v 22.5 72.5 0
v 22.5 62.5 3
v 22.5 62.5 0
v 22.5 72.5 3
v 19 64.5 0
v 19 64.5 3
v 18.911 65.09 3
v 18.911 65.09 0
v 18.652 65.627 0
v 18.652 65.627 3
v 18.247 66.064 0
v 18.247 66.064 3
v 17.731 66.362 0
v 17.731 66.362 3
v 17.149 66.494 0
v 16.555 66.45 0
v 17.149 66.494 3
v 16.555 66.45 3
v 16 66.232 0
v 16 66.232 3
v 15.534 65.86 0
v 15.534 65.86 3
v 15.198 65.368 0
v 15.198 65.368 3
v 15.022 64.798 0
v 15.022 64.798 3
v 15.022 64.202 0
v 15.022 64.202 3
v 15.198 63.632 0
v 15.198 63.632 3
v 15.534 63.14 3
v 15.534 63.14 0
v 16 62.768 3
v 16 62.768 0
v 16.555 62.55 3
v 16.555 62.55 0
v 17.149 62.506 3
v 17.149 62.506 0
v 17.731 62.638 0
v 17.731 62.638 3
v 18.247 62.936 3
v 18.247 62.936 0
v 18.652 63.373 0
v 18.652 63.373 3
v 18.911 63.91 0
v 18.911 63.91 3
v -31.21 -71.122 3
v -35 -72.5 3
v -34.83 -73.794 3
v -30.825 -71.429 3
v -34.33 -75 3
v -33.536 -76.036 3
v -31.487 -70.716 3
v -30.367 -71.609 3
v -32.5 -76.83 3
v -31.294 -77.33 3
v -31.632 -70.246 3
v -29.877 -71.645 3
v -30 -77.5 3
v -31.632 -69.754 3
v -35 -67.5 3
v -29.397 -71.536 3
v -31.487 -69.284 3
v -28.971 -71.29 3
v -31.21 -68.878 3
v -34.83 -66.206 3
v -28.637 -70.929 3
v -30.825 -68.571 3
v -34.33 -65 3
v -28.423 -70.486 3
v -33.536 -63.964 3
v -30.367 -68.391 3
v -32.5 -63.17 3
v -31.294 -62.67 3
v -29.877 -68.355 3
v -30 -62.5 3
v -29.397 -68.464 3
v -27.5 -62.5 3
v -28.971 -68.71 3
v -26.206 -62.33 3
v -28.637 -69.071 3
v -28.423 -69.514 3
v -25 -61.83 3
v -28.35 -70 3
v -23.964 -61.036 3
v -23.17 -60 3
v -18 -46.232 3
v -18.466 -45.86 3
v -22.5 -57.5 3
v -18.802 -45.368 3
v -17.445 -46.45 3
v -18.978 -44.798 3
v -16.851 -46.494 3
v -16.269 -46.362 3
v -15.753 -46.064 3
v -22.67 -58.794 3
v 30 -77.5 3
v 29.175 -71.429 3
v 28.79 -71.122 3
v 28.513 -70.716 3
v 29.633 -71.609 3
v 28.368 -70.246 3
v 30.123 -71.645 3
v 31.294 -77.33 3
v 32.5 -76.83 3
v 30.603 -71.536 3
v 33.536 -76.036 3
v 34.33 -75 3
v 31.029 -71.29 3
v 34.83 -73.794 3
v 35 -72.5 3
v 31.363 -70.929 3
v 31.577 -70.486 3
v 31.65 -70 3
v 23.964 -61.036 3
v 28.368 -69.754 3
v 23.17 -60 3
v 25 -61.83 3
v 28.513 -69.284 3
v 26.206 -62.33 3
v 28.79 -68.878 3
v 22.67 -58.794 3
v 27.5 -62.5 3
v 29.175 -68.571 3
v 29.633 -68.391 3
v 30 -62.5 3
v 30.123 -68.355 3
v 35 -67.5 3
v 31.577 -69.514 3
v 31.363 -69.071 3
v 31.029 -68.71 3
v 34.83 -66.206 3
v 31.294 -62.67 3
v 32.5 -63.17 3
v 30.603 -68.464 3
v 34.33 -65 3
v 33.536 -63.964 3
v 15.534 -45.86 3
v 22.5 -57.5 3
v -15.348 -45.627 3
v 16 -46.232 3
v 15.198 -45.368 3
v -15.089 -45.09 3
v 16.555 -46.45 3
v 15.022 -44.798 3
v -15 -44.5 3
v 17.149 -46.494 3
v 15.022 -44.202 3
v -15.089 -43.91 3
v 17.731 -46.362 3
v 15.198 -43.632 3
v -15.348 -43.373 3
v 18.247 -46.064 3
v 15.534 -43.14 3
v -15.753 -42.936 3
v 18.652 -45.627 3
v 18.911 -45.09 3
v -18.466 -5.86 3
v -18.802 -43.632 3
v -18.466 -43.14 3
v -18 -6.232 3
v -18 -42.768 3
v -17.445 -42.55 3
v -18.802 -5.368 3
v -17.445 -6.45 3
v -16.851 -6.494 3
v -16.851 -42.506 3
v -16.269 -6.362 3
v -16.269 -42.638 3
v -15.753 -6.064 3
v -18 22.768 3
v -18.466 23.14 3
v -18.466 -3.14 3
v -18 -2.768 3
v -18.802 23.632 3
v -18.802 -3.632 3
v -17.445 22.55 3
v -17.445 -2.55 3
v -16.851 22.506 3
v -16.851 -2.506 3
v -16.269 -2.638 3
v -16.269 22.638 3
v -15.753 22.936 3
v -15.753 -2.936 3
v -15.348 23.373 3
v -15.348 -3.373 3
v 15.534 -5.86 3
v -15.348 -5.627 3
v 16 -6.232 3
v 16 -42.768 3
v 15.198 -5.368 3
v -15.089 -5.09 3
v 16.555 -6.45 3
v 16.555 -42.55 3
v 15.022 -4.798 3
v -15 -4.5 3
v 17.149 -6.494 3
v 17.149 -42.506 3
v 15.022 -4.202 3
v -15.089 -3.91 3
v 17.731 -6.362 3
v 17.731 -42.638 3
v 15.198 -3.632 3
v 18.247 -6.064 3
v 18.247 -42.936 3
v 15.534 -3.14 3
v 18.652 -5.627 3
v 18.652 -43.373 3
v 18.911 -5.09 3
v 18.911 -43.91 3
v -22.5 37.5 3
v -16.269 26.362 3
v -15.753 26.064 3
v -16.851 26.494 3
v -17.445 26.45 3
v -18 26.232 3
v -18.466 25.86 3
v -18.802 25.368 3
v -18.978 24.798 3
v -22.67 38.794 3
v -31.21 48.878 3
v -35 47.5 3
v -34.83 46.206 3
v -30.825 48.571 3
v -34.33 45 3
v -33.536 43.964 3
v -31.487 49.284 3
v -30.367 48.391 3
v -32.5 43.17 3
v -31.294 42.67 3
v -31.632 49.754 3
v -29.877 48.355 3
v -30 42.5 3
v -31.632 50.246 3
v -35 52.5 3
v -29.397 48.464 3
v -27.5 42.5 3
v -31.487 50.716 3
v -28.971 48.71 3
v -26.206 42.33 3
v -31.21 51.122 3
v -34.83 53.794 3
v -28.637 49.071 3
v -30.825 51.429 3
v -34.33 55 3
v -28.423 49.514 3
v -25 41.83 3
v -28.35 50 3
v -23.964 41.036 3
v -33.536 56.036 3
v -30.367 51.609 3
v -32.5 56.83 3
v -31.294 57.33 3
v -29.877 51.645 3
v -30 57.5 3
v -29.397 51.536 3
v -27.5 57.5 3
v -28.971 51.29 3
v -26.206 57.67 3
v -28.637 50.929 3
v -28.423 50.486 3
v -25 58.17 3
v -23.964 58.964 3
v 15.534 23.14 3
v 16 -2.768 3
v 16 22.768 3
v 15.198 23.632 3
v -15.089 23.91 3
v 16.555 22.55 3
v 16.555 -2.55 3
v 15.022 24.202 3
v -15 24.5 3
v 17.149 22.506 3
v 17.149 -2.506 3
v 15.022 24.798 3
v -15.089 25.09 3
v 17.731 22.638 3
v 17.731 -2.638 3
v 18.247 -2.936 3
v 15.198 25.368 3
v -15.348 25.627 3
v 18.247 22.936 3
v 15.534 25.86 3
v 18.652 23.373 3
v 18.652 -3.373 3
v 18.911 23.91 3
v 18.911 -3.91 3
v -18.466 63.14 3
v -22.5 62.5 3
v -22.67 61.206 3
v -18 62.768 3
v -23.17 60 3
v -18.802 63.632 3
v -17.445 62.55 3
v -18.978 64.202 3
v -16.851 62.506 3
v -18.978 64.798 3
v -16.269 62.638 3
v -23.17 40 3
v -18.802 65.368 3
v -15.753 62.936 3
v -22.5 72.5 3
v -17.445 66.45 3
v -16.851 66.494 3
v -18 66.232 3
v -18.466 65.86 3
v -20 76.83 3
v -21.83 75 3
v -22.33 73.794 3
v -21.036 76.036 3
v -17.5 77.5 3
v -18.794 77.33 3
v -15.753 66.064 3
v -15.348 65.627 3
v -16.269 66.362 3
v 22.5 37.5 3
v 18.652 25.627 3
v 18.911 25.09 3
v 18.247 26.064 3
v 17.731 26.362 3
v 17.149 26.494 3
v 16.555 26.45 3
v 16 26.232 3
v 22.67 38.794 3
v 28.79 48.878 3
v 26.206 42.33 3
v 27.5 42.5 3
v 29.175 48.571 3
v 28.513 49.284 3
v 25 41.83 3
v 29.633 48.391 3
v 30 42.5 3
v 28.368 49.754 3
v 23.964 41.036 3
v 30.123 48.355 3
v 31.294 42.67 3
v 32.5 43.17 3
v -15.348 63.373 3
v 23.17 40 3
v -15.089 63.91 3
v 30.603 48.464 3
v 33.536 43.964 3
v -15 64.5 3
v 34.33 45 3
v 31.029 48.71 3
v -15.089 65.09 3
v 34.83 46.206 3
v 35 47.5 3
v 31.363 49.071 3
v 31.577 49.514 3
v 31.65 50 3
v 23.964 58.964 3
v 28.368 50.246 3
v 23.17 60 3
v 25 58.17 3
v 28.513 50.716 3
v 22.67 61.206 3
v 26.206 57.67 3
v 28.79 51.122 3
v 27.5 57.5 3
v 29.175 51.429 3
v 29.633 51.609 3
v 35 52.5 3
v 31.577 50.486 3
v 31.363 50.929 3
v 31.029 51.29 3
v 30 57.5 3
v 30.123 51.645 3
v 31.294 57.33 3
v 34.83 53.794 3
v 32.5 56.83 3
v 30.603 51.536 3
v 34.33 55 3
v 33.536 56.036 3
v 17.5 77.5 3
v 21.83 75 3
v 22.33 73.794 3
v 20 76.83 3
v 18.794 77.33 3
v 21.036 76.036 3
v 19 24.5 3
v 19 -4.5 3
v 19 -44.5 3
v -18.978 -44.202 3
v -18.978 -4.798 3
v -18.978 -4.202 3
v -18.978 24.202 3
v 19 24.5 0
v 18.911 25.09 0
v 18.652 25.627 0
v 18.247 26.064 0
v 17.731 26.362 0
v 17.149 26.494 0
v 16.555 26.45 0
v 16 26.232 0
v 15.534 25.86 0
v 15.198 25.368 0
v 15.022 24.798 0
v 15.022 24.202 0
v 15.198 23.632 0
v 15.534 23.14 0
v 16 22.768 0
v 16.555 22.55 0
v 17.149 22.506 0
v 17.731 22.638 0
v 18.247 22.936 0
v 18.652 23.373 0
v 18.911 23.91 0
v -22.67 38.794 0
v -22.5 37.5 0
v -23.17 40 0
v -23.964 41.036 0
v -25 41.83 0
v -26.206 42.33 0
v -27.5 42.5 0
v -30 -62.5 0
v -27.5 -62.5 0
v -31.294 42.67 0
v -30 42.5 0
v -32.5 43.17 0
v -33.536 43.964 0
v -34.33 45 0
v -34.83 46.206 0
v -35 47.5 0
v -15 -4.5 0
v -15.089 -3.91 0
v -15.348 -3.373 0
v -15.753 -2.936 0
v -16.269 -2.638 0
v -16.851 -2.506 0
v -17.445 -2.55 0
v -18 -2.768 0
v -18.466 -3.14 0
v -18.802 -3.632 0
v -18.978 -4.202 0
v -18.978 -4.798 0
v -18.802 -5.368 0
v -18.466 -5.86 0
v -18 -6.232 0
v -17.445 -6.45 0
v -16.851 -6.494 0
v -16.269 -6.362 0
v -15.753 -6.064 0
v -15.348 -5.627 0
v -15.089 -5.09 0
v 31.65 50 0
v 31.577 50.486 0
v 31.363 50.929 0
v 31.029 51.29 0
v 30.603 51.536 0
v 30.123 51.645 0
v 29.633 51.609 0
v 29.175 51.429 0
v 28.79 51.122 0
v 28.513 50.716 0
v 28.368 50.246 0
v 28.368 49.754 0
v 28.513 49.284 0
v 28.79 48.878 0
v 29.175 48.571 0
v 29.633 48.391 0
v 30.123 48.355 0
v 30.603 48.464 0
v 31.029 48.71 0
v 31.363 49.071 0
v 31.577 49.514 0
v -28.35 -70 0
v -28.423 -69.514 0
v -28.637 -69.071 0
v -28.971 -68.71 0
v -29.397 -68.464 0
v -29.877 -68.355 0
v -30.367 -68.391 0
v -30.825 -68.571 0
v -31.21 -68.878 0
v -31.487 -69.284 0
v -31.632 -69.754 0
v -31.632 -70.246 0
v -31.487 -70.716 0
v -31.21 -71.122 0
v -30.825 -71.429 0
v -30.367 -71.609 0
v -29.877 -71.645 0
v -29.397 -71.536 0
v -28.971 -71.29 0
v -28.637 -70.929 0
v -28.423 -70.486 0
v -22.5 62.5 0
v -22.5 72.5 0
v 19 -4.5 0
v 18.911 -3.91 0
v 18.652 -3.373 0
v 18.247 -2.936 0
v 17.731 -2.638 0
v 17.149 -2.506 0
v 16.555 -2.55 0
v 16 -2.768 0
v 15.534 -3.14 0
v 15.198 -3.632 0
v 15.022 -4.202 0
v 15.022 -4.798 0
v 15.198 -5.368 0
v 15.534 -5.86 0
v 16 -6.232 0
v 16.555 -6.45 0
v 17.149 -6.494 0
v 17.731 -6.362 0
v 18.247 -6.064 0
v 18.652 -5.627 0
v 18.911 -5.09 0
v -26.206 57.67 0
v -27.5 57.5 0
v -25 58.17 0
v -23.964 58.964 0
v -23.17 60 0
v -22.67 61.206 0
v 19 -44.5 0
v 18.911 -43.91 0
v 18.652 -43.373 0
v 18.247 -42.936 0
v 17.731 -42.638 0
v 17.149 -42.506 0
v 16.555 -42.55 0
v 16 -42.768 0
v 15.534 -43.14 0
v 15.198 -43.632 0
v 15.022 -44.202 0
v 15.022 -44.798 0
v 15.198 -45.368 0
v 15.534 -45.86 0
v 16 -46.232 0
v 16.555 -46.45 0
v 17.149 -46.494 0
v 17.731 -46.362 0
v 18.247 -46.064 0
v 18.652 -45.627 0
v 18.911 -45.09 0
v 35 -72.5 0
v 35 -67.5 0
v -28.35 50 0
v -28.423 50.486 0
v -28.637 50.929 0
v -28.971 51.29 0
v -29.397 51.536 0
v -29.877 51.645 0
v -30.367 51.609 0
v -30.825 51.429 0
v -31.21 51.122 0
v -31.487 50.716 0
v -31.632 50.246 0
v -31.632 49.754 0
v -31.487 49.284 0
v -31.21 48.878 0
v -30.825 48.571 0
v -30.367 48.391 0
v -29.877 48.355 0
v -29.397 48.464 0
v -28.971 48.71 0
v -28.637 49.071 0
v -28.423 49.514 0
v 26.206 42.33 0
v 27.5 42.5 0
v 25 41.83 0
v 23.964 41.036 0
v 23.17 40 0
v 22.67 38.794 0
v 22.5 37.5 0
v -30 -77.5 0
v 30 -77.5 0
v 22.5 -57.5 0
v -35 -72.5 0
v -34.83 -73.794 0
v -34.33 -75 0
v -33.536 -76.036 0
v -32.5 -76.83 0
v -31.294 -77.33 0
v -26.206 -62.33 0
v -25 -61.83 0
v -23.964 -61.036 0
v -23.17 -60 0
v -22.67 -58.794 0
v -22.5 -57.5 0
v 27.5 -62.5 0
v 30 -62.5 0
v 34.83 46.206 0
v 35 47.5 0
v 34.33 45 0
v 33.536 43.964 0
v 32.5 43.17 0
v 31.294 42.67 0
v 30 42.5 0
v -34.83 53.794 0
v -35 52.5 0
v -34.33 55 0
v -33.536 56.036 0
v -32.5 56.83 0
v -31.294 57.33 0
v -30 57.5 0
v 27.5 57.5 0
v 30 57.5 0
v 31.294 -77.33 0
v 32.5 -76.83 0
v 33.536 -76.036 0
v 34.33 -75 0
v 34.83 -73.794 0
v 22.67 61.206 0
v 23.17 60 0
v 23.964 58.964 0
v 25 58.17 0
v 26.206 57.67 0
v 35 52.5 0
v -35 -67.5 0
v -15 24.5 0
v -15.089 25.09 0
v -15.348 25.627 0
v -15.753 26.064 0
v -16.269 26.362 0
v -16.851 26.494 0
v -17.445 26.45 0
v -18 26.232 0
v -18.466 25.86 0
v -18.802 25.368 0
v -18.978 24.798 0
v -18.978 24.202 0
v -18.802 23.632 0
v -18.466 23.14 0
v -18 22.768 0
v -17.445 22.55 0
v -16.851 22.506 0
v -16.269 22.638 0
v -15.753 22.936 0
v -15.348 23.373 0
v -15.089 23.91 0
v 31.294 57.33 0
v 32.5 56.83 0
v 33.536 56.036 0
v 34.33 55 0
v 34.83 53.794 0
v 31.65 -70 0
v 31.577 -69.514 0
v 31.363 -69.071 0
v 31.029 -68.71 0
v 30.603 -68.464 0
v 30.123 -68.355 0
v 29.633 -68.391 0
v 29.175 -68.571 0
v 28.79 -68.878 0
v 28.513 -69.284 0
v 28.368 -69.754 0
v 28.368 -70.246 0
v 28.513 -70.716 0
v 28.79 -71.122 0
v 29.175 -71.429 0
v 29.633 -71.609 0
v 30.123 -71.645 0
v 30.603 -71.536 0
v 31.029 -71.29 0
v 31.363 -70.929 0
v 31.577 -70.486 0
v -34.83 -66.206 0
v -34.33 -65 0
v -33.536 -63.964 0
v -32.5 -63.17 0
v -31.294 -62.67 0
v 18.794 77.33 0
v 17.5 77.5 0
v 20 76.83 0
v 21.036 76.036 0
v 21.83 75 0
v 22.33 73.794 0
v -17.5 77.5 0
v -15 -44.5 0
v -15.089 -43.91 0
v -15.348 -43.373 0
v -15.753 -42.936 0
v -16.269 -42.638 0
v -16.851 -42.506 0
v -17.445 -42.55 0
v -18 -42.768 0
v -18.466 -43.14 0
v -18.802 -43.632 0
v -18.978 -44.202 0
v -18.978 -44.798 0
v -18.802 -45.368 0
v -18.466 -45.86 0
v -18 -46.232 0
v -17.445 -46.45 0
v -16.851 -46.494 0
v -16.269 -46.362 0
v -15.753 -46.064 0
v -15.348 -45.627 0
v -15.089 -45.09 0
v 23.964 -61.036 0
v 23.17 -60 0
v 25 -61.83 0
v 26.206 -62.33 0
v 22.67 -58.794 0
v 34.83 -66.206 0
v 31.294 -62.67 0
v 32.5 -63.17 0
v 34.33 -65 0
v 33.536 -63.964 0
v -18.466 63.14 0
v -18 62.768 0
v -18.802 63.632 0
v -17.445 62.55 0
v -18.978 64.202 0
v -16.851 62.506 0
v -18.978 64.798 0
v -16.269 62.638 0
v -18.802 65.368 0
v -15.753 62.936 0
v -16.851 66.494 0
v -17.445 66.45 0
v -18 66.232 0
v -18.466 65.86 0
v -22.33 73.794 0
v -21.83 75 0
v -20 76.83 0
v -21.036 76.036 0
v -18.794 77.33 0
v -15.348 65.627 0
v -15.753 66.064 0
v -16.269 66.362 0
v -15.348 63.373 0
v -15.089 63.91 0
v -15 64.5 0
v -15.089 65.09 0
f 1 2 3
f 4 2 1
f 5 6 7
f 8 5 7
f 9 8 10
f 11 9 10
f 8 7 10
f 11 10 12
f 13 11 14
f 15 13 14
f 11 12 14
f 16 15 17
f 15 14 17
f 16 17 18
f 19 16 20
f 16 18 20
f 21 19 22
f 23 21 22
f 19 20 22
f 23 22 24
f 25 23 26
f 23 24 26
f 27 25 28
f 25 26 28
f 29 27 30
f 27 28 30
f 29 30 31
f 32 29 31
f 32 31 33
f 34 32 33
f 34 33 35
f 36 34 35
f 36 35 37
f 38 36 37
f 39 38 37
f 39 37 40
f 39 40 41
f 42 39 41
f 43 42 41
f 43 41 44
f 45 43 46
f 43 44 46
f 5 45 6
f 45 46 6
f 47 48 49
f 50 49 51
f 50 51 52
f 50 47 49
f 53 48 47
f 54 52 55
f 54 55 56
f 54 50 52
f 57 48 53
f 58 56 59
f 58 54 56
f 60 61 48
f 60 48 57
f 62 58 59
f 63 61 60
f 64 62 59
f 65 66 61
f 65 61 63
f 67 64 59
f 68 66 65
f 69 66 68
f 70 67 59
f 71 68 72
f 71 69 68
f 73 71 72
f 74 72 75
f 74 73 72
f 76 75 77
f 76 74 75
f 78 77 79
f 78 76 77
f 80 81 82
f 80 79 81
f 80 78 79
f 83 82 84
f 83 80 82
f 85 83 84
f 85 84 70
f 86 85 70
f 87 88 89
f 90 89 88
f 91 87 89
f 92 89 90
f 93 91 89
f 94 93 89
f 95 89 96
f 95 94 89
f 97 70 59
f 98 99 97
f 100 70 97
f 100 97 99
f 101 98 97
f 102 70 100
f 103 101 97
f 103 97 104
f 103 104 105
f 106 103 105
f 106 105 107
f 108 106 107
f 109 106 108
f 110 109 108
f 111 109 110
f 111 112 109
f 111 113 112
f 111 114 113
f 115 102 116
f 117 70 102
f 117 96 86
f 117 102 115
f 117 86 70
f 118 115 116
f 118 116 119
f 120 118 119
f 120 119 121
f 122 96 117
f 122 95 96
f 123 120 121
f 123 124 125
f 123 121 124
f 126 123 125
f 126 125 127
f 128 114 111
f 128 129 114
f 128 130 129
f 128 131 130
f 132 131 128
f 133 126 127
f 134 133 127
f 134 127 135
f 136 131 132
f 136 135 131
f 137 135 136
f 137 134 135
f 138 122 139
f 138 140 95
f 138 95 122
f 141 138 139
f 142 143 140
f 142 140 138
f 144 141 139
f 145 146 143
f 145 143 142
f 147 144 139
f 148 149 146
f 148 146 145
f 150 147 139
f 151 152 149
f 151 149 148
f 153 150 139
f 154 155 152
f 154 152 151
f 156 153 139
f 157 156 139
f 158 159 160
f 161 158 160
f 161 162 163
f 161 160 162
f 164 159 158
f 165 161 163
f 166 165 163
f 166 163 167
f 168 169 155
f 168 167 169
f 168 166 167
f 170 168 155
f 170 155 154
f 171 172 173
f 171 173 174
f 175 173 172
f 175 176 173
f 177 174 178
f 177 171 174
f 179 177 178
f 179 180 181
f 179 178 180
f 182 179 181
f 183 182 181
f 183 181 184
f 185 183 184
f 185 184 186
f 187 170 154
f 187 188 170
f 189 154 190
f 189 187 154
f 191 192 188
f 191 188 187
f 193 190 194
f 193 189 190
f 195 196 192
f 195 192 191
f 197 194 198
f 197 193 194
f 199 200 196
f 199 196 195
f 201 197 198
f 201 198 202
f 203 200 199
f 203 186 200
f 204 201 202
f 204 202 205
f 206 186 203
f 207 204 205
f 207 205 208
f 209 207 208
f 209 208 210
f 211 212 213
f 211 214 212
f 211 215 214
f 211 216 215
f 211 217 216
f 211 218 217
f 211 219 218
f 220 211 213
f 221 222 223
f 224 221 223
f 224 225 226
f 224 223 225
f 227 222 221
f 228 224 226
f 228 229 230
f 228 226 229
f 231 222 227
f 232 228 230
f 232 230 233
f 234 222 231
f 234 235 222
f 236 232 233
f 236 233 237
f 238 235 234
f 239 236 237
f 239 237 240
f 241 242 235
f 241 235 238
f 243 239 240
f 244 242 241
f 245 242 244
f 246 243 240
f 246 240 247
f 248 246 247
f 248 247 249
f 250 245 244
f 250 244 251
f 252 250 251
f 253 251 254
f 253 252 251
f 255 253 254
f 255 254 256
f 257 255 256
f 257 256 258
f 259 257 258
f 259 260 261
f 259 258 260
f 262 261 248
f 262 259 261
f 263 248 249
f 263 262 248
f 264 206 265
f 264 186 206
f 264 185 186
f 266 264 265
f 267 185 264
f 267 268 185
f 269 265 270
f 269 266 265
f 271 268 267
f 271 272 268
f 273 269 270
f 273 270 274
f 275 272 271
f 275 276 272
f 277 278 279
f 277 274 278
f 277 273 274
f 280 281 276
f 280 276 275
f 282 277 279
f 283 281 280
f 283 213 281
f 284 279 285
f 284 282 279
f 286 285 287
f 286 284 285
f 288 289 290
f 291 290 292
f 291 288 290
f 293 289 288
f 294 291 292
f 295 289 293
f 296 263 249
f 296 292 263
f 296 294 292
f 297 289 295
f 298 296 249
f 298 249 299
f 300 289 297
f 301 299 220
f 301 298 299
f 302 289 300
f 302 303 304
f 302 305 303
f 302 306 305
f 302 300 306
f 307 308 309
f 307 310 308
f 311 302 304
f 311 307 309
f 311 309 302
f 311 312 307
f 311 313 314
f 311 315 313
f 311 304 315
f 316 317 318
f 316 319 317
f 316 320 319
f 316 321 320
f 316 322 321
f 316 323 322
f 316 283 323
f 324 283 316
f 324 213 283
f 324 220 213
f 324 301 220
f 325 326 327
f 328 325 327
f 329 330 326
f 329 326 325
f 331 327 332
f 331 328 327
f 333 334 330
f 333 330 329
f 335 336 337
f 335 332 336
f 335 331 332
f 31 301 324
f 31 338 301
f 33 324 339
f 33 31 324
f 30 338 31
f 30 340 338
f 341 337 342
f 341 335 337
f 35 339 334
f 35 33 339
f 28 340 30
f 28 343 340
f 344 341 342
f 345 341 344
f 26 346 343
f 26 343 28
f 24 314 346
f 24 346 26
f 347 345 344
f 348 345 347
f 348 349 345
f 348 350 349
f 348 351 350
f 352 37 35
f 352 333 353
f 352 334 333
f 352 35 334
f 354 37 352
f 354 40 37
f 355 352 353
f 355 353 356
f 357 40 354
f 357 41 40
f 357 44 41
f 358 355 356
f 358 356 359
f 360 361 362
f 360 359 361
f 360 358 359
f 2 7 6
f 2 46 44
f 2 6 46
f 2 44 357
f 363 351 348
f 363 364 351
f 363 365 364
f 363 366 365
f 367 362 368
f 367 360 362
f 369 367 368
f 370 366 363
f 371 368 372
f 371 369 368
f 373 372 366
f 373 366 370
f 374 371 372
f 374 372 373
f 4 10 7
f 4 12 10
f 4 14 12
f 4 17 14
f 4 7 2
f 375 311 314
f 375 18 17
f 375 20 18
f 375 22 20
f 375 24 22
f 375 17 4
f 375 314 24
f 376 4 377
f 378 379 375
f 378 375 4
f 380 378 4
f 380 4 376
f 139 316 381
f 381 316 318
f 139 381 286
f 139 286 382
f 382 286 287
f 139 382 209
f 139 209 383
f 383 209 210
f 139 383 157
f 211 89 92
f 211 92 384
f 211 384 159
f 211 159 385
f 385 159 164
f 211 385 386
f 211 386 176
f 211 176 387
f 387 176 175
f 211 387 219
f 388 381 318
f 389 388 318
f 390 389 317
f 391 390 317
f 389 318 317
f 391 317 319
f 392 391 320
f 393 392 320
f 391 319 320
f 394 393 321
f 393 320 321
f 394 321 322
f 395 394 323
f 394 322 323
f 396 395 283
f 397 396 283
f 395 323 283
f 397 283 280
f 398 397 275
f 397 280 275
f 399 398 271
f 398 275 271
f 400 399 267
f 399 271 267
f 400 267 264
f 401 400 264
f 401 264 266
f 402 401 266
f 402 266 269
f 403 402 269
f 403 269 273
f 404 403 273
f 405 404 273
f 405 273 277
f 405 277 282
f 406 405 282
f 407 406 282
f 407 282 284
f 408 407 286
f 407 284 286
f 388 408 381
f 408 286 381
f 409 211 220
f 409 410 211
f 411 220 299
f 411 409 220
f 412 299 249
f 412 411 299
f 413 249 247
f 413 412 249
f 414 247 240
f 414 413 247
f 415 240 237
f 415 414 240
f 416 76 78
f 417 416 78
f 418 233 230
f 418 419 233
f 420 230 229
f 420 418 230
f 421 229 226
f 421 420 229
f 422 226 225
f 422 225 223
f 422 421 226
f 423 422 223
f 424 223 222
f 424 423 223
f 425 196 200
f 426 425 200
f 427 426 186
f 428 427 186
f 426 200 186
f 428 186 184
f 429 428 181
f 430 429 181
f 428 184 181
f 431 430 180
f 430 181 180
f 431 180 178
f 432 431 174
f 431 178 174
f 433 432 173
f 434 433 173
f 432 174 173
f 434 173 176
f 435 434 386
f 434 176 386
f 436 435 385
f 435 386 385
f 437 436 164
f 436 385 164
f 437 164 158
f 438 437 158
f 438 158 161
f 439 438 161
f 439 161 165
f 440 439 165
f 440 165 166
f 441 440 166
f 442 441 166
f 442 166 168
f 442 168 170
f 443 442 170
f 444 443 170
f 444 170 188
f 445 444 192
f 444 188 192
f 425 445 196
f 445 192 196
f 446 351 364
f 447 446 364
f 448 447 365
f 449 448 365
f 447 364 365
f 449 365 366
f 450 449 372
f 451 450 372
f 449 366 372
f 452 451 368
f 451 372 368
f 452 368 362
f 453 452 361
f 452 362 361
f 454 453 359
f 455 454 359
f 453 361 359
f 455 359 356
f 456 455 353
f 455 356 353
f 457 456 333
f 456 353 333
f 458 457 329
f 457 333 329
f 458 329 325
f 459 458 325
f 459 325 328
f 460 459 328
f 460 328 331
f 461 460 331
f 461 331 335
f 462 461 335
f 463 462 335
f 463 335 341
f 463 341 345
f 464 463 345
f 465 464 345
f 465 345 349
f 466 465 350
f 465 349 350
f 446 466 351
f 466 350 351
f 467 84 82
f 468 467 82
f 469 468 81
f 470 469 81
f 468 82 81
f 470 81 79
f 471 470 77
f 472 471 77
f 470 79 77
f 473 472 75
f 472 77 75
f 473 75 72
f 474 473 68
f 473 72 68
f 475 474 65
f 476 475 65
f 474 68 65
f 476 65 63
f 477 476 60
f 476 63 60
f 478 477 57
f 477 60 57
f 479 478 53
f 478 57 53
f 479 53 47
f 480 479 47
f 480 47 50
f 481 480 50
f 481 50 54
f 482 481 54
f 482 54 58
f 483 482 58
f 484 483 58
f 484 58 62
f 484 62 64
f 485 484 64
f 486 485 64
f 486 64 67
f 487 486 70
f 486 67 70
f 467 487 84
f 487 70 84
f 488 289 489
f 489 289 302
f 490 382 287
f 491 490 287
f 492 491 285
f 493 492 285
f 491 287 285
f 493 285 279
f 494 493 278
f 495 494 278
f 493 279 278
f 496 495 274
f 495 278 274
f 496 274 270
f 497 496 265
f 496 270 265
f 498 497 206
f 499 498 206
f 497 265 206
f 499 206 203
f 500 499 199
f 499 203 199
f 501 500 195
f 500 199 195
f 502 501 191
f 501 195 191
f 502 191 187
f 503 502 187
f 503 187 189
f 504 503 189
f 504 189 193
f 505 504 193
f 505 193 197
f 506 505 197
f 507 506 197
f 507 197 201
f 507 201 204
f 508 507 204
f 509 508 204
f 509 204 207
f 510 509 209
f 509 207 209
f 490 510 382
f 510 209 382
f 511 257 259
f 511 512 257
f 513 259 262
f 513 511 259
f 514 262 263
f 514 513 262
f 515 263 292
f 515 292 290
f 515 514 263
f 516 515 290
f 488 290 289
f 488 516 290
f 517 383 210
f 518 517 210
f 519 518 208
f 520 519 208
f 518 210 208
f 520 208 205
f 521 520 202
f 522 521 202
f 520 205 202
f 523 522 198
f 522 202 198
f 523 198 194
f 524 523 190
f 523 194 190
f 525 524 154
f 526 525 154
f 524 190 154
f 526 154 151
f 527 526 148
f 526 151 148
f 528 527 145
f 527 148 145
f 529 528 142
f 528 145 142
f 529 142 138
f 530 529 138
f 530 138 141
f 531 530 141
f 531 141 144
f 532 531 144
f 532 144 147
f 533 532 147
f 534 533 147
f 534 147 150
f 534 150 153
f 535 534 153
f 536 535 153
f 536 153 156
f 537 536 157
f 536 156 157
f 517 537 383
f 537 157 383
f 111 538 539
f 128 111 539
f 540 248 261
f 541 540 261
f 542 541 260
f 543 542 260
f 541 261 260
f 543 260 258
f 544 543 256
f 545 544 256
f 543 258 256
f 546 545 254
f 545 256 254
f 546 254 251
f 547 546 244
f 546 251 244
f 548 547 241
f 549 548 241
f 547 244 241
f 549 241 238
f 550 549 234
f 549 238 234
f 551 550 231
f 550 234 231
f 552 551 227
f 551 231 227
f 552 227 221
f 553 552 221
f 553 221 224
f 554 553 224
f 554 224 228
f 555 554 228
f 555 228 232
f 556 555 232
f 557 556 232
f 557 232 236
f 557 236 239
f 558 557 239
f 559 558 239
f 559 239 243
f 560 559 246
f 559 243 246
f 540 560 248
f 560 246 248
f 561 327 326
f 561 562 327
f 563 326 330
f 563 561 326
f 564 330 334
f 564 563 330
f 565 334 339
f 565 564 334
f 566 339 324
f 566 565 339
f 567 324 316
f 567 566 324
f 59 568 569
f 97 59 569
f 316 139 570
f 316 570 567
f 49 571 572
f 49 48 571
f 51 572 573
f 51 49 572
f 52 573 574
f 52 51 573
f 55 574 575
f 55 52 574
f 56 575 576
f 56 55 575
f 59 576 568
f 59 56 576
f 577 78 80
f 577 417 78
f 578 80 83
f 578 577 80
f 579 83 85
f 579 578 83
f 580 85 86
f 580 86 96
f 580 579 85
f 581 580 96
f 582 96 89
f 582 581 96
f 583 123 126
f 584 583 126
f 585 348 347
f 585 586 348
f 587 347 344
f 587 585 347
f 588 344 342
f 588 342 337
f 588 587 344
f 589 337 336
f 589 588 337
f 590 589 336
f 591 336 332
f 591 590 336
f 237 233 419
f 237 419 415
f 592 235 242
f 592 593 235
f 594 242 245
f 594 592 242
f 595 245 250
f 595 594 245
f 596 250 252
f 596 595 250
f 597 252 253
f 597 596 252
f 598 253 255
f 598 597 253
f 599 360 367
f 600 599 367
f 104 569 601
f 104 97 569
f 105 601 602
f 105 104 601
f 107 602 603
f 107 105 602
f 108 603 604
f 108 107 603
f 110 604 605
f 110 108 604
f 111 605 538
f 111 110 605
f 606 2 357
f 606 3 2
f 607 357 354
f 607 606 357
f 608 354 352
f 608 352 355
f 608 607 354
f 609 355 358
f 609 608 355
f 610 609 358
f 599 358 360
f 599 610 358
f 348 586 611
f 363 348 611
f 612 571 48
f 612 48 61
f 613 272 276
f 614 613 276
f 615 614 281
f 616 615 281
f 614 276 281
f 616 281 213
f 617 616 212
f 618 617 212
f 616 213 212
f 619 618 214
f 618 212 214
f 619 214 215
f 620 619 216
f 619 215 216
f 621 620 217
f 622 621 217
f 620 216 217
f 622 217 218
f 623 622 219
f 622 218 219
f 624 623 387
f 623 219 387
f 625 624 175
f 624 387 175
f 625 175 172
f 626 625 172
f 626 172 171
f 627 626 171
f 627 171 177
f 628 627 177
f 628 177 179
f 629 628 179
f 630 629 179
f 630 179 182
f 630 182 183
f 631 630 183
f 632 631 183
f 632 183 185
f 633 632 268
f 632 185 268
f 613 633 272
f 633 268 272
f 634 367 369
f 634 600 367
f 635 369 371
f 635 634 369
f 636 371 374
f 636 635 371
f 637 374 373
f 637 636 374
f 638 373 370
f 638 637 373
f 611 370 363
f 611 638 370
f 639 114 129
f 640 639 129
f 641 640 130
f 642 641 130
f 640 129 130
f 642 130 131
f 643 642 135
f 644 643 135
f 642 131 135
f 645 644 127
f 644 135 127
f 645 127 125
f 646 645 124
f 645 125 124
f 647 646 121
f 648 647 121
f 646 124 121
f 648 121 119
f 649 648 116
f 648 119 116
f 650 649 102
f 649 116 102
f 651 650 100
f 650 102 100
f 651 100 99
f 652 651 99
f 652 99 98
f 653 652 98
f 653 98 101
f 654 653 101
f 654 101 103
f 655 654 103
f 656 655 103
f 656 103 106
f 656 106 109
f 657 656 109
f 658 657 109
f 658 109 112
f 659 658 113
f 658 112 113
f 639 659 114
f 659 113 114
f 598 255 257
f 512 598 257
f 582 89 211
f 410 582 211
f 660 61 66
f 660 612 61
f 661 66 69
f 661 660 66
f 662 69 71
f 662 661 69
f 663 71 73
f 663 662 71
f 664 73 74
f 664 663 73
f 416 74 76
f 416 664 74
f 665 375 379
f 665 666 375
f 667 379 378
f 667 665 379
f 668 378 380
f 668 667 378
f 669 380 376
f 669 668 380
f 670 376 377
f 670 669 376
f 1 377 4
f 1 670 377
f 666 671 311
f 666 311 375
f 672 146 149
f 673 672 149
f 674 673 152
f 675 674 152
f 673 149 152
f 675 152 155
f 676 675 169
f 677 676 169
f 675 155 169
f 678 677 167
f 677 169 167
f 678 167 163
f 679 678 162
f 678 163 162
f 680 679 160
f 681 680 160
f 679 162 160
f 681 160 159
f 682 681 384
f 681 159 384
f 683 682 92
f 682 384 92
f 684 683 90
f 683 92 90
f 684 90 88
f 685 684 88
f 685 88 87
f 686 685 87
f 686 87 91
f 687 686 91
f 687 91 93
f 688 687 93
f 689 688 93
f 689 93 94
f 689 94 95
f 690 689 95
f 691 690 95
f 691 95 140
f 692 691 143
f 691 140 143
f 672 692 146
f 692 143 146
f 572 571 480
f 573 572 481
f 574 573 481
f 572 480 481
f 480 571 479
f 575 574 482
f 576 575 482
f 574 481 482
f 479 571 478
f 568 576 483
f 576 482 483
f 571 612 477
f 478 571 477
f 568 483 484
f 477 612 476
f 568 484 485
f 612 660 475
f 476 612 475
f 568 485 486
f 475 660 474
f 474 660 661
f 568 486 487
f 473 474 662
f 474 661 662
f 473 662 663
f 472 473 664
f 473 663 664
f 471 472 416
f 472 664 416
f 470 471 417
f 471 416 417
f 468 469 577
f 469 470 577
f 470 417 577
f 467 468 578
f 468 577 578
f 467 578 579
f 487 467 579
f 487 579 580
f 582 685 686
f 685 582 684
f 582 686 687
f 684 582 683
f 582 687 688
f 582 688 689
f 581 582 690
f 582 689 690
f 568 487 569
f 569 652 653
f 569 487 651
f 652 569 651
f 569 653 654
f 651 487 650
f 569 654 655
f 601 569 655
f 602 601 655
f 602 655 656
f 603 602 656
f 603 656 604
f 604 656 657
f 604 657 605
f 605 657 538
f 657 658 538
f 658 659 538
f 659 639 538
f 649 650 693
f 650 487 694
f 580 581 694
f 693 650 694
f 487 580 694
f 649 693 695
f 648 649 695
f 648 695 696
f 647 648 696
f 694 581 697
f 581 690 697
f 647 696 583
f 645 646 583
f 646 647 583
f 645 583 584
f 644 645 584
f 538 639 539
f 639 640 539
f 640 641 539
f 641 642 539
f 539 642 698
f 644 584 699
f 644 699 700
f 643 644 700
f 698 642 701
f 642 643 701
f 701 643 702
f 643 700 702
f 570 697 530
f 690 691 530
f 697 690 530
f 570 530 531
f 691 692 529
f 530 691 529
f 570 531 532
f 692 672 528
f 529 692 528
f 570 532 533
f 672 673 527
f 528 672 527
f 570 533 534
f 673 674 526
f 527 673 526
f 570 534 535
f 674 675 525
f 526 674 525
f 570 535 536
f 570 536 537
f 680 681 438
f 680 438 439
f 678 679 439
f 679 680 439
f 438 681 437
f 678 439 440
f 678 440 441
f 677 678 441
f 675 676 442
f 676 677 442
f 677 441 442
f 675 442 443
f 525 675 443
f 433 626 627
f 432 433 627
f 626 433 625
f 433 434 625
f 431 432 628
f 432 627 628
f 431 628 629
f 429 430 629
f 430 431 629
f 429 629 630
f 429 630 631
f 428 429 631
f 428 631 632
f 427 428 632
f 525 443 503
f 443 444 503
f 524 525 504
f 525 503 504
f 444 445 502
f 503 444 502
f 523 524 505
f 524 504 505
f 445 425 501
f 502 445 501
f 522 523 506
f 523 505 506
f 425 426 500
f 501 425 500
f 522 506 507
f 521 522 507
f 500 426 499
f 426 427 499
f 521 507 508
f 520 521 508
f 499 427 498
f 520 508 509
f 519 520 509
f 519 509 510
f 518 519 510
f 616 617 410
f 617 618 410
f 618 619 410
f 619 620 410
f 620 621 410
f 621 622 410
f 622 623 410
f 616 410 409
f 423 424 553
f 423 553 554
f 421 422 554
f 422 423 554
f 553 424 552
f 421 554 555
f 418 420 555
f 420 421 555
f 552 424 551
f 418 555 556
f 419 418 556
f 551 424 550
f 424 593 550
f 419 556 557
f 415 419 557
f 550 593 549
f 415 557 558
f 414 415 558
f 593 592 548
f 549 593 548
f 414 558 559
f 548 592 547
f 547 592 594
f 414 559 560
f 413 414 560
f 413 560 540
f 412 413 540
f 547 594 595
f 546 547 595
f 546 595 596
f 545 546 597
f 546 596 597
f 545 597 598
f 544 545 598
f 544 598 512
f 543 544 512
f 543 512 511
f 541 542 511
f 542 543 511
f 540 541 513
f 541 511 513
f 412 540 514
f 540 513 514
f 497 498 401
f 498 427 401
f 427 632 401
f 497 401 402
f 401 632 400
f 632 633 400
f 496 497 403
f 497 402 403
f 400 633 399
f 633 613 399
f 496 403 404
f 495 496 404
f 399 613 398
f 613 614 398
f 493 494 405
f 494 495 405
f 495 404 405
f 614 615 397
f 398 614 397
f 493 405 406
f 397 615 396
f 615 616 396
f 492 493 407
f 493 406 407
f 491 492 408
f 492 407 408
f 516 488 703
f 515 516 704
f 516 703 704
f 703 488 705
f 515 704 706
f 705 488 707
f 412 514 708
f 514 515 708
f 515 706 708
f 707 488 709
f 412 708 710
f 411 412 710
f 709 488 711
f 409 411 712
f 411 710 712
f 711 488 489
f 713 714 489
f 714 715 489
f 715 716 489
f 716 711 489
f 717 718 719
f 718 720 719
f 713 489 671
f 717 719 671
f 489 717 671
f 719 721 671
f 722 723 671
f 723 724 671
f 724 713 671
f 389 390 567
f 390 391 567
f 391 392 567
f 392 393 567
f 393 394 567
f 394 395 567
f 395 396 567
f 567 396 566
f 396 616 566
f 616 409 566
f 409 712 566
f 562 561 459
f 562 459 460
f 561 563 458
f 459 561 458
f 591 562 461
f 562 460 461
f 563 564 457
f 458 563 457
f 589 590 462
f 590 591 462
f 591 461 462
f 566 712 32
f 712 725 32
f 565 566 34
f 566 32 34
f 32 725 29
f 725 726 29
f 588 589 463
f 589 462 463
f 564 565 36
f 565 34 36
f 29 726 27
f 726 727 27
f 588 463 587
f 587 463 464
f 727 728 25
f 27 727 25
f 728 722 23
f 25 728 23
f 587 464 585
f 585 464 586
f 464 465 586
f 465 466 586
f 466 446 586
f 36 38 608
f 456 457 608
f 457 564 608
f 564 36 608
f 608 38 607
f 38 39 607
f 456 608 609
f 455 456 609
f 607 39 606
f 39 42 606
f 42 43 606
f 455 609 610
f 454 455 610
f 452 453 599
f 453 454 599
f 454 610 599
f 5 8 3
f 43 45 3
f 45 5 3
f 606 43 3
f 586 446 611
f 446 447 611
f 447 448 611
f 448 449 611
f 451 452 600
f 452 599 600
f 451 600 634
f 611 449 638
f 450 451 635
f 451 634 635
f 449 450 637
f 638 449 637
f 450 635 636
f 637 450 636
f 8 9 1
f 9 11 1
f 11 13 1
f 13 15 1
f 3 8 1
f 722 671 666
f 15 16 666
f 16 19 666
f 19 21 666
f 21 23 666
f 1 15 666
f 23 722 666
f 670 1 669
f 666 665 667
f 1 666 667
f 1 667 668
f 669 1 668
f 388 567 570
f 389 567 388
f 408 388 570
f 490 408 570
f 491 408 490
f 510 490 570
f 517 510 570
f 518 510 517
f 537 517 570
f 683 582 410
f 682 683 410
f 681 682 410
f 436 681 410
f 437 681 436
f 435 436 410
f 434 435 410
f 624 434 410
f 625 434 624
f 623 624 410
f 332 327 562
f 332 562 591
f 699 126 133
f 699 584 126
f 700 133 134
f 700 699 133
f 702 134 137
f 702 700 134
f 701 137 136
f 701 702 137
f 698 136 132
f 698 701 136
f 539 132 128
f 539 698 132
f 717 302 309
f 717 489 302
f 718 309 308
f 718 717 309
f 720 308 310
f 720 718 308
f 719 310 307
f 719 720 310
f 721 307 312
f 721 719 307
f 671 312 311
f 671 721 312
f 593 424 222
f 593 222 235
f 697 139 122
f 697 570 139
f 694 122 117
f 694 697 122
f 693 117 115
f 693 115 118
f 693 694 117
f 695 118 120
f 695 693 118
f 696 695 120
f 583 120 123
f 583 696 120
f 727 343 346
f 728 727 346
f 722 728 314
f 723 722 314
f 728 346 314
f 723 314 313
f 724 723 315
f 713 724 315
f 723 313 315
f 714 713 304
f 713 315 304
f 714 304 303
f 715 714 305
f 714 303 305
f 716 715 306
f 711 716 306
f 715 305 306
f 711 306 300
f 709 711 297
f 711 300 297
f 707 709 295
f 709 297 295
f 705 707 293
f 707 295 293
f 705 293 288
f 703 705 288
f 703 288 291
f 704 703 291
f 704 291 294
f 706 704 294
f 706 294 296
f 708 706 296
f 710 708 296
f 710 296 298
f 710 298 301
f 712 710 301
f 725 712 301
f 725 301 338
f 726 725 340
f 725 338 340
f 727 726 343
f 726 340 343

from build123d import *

# Parameters (mm, degrees)
SKETCH_1_W          = 70
SKETCH_1_H          = 155
EXTRUDE_1_DEPTH     = 3
SKETCH_2_R          = 2
SKETCH_2_R_2        = 1.65
CUT_EXTRUDE_1_DEPTH = 3
SKETCH_3_W          = 12.5
SKETCH_3_H          = 105
SKETCH_3_H_2        = 20
CUT_EXTRUDE_2_DEPTH = 10
FILLET_1_R          = 5


with BuildPart() as part:
    # ｽｹｯﾁ1 → ﾎﾞｽ - 押し出し1 (new body)
    with BuildSketch(Plane.XY):
        Rectangle(SKETCH_1_W, SKETCH_1_H)
    extrude(amount=EXTRUDE_1_DEPTH)

    # ｽｹｯﾁ2 → ｶｯﾄ - 押し出し1 (cut)
    with BuildSketch(Plane.XY.offset(3)):
        with Locations((-17, -44.5)):
            Circle(SKETCH_2_R)
        with Locations((17, -44.5)):
            Circle(SKETCH_2_R)
        with Locations((17, -4.5)):
            Circle(SKETCH_2_R)
        with Locations((-17, -4.5)):
            Circle(SKETCH_2_R)
        with Locations((-17, 24.5)):
            Circle(SKETCH_2_R)
        with Locations((-17, 64.5)):
            Circle(SKETCH_2_R)
        with Locations((17, 64.5)):
            Circle(SKETCH_2_R)
        with Locations((17, 24.5)):
            Circle(SKETCH_2_R)
        with Locations((-30, -70)):
            Circle(SKETCH_2_R_2)
        with Locations((30, -70)):
            Circle(SKETCH_2_R_2)
        with Locations((30, 50)):
            Circle(SKETCH_2_R_2)
        with Locations((-30, 50)):
            Circle(SKETCH_2_R_2)
    extrude(amount=-CUT_EXTRUDE_1_DEPTH, mode=Mode.SUBTRACT)

    # ｽｹｯﾁ3 → ｶｯﾄ - 押し出し2 (cut)
    with BuildSketch(Plane.XY.offset(3)):
        with Locations((-28.75, -10)):
            Rectangle(SKETCH_3_W, SKETCH_3_H)
        with Locations((28.75, -10)):
            Rectangle(SKETCH_3_W, SKETCH_3_H)
        with Locations((-28.75, 67.5)):
            Rectangle(SKETCH_3_W, SKETCH_3_H_2)
        with Locations((28.75, 67.5)):
            Rectangle(SKETCH_3_W, SKETCH_3_H_2)
    extrude(amount=-CUT_EXTRUDE_2_DEPTH, mode=Mode.SUBTRACT)

    # ﾌｨﾚｯﾄ1
    fillet_1_edges = [part.edges().sort_by_distance(p)[0] for p in [
        (35, 57.5, 1.5),
        (22.5, 57.5, 1.5),
        (22.5, 77.5, 1.5),
        (35, 42.5, 1.5),
        (35, -62.5, 1.5),
        (22.5, -62.5, 1.5),
        (22.5, 42.5, 1.5),
        (-35, -62.5, 1.5),
        (-35, 42.5, 1.5),
        (-22.5, 42.5, 1.5),
        (-22.5, -62.5, 1.5),
        (-35, -77.5, 1.5),
        (35, -77.5, 1.5),
        (-35, 57.5, 1.5),
        (-22.5, 77.5, 1.5),
        (-22.5, 57.5, 1.5),
    ]]
    fillet(fillet_1_edges, radius=FILLET_1_R)


solid = part.part
